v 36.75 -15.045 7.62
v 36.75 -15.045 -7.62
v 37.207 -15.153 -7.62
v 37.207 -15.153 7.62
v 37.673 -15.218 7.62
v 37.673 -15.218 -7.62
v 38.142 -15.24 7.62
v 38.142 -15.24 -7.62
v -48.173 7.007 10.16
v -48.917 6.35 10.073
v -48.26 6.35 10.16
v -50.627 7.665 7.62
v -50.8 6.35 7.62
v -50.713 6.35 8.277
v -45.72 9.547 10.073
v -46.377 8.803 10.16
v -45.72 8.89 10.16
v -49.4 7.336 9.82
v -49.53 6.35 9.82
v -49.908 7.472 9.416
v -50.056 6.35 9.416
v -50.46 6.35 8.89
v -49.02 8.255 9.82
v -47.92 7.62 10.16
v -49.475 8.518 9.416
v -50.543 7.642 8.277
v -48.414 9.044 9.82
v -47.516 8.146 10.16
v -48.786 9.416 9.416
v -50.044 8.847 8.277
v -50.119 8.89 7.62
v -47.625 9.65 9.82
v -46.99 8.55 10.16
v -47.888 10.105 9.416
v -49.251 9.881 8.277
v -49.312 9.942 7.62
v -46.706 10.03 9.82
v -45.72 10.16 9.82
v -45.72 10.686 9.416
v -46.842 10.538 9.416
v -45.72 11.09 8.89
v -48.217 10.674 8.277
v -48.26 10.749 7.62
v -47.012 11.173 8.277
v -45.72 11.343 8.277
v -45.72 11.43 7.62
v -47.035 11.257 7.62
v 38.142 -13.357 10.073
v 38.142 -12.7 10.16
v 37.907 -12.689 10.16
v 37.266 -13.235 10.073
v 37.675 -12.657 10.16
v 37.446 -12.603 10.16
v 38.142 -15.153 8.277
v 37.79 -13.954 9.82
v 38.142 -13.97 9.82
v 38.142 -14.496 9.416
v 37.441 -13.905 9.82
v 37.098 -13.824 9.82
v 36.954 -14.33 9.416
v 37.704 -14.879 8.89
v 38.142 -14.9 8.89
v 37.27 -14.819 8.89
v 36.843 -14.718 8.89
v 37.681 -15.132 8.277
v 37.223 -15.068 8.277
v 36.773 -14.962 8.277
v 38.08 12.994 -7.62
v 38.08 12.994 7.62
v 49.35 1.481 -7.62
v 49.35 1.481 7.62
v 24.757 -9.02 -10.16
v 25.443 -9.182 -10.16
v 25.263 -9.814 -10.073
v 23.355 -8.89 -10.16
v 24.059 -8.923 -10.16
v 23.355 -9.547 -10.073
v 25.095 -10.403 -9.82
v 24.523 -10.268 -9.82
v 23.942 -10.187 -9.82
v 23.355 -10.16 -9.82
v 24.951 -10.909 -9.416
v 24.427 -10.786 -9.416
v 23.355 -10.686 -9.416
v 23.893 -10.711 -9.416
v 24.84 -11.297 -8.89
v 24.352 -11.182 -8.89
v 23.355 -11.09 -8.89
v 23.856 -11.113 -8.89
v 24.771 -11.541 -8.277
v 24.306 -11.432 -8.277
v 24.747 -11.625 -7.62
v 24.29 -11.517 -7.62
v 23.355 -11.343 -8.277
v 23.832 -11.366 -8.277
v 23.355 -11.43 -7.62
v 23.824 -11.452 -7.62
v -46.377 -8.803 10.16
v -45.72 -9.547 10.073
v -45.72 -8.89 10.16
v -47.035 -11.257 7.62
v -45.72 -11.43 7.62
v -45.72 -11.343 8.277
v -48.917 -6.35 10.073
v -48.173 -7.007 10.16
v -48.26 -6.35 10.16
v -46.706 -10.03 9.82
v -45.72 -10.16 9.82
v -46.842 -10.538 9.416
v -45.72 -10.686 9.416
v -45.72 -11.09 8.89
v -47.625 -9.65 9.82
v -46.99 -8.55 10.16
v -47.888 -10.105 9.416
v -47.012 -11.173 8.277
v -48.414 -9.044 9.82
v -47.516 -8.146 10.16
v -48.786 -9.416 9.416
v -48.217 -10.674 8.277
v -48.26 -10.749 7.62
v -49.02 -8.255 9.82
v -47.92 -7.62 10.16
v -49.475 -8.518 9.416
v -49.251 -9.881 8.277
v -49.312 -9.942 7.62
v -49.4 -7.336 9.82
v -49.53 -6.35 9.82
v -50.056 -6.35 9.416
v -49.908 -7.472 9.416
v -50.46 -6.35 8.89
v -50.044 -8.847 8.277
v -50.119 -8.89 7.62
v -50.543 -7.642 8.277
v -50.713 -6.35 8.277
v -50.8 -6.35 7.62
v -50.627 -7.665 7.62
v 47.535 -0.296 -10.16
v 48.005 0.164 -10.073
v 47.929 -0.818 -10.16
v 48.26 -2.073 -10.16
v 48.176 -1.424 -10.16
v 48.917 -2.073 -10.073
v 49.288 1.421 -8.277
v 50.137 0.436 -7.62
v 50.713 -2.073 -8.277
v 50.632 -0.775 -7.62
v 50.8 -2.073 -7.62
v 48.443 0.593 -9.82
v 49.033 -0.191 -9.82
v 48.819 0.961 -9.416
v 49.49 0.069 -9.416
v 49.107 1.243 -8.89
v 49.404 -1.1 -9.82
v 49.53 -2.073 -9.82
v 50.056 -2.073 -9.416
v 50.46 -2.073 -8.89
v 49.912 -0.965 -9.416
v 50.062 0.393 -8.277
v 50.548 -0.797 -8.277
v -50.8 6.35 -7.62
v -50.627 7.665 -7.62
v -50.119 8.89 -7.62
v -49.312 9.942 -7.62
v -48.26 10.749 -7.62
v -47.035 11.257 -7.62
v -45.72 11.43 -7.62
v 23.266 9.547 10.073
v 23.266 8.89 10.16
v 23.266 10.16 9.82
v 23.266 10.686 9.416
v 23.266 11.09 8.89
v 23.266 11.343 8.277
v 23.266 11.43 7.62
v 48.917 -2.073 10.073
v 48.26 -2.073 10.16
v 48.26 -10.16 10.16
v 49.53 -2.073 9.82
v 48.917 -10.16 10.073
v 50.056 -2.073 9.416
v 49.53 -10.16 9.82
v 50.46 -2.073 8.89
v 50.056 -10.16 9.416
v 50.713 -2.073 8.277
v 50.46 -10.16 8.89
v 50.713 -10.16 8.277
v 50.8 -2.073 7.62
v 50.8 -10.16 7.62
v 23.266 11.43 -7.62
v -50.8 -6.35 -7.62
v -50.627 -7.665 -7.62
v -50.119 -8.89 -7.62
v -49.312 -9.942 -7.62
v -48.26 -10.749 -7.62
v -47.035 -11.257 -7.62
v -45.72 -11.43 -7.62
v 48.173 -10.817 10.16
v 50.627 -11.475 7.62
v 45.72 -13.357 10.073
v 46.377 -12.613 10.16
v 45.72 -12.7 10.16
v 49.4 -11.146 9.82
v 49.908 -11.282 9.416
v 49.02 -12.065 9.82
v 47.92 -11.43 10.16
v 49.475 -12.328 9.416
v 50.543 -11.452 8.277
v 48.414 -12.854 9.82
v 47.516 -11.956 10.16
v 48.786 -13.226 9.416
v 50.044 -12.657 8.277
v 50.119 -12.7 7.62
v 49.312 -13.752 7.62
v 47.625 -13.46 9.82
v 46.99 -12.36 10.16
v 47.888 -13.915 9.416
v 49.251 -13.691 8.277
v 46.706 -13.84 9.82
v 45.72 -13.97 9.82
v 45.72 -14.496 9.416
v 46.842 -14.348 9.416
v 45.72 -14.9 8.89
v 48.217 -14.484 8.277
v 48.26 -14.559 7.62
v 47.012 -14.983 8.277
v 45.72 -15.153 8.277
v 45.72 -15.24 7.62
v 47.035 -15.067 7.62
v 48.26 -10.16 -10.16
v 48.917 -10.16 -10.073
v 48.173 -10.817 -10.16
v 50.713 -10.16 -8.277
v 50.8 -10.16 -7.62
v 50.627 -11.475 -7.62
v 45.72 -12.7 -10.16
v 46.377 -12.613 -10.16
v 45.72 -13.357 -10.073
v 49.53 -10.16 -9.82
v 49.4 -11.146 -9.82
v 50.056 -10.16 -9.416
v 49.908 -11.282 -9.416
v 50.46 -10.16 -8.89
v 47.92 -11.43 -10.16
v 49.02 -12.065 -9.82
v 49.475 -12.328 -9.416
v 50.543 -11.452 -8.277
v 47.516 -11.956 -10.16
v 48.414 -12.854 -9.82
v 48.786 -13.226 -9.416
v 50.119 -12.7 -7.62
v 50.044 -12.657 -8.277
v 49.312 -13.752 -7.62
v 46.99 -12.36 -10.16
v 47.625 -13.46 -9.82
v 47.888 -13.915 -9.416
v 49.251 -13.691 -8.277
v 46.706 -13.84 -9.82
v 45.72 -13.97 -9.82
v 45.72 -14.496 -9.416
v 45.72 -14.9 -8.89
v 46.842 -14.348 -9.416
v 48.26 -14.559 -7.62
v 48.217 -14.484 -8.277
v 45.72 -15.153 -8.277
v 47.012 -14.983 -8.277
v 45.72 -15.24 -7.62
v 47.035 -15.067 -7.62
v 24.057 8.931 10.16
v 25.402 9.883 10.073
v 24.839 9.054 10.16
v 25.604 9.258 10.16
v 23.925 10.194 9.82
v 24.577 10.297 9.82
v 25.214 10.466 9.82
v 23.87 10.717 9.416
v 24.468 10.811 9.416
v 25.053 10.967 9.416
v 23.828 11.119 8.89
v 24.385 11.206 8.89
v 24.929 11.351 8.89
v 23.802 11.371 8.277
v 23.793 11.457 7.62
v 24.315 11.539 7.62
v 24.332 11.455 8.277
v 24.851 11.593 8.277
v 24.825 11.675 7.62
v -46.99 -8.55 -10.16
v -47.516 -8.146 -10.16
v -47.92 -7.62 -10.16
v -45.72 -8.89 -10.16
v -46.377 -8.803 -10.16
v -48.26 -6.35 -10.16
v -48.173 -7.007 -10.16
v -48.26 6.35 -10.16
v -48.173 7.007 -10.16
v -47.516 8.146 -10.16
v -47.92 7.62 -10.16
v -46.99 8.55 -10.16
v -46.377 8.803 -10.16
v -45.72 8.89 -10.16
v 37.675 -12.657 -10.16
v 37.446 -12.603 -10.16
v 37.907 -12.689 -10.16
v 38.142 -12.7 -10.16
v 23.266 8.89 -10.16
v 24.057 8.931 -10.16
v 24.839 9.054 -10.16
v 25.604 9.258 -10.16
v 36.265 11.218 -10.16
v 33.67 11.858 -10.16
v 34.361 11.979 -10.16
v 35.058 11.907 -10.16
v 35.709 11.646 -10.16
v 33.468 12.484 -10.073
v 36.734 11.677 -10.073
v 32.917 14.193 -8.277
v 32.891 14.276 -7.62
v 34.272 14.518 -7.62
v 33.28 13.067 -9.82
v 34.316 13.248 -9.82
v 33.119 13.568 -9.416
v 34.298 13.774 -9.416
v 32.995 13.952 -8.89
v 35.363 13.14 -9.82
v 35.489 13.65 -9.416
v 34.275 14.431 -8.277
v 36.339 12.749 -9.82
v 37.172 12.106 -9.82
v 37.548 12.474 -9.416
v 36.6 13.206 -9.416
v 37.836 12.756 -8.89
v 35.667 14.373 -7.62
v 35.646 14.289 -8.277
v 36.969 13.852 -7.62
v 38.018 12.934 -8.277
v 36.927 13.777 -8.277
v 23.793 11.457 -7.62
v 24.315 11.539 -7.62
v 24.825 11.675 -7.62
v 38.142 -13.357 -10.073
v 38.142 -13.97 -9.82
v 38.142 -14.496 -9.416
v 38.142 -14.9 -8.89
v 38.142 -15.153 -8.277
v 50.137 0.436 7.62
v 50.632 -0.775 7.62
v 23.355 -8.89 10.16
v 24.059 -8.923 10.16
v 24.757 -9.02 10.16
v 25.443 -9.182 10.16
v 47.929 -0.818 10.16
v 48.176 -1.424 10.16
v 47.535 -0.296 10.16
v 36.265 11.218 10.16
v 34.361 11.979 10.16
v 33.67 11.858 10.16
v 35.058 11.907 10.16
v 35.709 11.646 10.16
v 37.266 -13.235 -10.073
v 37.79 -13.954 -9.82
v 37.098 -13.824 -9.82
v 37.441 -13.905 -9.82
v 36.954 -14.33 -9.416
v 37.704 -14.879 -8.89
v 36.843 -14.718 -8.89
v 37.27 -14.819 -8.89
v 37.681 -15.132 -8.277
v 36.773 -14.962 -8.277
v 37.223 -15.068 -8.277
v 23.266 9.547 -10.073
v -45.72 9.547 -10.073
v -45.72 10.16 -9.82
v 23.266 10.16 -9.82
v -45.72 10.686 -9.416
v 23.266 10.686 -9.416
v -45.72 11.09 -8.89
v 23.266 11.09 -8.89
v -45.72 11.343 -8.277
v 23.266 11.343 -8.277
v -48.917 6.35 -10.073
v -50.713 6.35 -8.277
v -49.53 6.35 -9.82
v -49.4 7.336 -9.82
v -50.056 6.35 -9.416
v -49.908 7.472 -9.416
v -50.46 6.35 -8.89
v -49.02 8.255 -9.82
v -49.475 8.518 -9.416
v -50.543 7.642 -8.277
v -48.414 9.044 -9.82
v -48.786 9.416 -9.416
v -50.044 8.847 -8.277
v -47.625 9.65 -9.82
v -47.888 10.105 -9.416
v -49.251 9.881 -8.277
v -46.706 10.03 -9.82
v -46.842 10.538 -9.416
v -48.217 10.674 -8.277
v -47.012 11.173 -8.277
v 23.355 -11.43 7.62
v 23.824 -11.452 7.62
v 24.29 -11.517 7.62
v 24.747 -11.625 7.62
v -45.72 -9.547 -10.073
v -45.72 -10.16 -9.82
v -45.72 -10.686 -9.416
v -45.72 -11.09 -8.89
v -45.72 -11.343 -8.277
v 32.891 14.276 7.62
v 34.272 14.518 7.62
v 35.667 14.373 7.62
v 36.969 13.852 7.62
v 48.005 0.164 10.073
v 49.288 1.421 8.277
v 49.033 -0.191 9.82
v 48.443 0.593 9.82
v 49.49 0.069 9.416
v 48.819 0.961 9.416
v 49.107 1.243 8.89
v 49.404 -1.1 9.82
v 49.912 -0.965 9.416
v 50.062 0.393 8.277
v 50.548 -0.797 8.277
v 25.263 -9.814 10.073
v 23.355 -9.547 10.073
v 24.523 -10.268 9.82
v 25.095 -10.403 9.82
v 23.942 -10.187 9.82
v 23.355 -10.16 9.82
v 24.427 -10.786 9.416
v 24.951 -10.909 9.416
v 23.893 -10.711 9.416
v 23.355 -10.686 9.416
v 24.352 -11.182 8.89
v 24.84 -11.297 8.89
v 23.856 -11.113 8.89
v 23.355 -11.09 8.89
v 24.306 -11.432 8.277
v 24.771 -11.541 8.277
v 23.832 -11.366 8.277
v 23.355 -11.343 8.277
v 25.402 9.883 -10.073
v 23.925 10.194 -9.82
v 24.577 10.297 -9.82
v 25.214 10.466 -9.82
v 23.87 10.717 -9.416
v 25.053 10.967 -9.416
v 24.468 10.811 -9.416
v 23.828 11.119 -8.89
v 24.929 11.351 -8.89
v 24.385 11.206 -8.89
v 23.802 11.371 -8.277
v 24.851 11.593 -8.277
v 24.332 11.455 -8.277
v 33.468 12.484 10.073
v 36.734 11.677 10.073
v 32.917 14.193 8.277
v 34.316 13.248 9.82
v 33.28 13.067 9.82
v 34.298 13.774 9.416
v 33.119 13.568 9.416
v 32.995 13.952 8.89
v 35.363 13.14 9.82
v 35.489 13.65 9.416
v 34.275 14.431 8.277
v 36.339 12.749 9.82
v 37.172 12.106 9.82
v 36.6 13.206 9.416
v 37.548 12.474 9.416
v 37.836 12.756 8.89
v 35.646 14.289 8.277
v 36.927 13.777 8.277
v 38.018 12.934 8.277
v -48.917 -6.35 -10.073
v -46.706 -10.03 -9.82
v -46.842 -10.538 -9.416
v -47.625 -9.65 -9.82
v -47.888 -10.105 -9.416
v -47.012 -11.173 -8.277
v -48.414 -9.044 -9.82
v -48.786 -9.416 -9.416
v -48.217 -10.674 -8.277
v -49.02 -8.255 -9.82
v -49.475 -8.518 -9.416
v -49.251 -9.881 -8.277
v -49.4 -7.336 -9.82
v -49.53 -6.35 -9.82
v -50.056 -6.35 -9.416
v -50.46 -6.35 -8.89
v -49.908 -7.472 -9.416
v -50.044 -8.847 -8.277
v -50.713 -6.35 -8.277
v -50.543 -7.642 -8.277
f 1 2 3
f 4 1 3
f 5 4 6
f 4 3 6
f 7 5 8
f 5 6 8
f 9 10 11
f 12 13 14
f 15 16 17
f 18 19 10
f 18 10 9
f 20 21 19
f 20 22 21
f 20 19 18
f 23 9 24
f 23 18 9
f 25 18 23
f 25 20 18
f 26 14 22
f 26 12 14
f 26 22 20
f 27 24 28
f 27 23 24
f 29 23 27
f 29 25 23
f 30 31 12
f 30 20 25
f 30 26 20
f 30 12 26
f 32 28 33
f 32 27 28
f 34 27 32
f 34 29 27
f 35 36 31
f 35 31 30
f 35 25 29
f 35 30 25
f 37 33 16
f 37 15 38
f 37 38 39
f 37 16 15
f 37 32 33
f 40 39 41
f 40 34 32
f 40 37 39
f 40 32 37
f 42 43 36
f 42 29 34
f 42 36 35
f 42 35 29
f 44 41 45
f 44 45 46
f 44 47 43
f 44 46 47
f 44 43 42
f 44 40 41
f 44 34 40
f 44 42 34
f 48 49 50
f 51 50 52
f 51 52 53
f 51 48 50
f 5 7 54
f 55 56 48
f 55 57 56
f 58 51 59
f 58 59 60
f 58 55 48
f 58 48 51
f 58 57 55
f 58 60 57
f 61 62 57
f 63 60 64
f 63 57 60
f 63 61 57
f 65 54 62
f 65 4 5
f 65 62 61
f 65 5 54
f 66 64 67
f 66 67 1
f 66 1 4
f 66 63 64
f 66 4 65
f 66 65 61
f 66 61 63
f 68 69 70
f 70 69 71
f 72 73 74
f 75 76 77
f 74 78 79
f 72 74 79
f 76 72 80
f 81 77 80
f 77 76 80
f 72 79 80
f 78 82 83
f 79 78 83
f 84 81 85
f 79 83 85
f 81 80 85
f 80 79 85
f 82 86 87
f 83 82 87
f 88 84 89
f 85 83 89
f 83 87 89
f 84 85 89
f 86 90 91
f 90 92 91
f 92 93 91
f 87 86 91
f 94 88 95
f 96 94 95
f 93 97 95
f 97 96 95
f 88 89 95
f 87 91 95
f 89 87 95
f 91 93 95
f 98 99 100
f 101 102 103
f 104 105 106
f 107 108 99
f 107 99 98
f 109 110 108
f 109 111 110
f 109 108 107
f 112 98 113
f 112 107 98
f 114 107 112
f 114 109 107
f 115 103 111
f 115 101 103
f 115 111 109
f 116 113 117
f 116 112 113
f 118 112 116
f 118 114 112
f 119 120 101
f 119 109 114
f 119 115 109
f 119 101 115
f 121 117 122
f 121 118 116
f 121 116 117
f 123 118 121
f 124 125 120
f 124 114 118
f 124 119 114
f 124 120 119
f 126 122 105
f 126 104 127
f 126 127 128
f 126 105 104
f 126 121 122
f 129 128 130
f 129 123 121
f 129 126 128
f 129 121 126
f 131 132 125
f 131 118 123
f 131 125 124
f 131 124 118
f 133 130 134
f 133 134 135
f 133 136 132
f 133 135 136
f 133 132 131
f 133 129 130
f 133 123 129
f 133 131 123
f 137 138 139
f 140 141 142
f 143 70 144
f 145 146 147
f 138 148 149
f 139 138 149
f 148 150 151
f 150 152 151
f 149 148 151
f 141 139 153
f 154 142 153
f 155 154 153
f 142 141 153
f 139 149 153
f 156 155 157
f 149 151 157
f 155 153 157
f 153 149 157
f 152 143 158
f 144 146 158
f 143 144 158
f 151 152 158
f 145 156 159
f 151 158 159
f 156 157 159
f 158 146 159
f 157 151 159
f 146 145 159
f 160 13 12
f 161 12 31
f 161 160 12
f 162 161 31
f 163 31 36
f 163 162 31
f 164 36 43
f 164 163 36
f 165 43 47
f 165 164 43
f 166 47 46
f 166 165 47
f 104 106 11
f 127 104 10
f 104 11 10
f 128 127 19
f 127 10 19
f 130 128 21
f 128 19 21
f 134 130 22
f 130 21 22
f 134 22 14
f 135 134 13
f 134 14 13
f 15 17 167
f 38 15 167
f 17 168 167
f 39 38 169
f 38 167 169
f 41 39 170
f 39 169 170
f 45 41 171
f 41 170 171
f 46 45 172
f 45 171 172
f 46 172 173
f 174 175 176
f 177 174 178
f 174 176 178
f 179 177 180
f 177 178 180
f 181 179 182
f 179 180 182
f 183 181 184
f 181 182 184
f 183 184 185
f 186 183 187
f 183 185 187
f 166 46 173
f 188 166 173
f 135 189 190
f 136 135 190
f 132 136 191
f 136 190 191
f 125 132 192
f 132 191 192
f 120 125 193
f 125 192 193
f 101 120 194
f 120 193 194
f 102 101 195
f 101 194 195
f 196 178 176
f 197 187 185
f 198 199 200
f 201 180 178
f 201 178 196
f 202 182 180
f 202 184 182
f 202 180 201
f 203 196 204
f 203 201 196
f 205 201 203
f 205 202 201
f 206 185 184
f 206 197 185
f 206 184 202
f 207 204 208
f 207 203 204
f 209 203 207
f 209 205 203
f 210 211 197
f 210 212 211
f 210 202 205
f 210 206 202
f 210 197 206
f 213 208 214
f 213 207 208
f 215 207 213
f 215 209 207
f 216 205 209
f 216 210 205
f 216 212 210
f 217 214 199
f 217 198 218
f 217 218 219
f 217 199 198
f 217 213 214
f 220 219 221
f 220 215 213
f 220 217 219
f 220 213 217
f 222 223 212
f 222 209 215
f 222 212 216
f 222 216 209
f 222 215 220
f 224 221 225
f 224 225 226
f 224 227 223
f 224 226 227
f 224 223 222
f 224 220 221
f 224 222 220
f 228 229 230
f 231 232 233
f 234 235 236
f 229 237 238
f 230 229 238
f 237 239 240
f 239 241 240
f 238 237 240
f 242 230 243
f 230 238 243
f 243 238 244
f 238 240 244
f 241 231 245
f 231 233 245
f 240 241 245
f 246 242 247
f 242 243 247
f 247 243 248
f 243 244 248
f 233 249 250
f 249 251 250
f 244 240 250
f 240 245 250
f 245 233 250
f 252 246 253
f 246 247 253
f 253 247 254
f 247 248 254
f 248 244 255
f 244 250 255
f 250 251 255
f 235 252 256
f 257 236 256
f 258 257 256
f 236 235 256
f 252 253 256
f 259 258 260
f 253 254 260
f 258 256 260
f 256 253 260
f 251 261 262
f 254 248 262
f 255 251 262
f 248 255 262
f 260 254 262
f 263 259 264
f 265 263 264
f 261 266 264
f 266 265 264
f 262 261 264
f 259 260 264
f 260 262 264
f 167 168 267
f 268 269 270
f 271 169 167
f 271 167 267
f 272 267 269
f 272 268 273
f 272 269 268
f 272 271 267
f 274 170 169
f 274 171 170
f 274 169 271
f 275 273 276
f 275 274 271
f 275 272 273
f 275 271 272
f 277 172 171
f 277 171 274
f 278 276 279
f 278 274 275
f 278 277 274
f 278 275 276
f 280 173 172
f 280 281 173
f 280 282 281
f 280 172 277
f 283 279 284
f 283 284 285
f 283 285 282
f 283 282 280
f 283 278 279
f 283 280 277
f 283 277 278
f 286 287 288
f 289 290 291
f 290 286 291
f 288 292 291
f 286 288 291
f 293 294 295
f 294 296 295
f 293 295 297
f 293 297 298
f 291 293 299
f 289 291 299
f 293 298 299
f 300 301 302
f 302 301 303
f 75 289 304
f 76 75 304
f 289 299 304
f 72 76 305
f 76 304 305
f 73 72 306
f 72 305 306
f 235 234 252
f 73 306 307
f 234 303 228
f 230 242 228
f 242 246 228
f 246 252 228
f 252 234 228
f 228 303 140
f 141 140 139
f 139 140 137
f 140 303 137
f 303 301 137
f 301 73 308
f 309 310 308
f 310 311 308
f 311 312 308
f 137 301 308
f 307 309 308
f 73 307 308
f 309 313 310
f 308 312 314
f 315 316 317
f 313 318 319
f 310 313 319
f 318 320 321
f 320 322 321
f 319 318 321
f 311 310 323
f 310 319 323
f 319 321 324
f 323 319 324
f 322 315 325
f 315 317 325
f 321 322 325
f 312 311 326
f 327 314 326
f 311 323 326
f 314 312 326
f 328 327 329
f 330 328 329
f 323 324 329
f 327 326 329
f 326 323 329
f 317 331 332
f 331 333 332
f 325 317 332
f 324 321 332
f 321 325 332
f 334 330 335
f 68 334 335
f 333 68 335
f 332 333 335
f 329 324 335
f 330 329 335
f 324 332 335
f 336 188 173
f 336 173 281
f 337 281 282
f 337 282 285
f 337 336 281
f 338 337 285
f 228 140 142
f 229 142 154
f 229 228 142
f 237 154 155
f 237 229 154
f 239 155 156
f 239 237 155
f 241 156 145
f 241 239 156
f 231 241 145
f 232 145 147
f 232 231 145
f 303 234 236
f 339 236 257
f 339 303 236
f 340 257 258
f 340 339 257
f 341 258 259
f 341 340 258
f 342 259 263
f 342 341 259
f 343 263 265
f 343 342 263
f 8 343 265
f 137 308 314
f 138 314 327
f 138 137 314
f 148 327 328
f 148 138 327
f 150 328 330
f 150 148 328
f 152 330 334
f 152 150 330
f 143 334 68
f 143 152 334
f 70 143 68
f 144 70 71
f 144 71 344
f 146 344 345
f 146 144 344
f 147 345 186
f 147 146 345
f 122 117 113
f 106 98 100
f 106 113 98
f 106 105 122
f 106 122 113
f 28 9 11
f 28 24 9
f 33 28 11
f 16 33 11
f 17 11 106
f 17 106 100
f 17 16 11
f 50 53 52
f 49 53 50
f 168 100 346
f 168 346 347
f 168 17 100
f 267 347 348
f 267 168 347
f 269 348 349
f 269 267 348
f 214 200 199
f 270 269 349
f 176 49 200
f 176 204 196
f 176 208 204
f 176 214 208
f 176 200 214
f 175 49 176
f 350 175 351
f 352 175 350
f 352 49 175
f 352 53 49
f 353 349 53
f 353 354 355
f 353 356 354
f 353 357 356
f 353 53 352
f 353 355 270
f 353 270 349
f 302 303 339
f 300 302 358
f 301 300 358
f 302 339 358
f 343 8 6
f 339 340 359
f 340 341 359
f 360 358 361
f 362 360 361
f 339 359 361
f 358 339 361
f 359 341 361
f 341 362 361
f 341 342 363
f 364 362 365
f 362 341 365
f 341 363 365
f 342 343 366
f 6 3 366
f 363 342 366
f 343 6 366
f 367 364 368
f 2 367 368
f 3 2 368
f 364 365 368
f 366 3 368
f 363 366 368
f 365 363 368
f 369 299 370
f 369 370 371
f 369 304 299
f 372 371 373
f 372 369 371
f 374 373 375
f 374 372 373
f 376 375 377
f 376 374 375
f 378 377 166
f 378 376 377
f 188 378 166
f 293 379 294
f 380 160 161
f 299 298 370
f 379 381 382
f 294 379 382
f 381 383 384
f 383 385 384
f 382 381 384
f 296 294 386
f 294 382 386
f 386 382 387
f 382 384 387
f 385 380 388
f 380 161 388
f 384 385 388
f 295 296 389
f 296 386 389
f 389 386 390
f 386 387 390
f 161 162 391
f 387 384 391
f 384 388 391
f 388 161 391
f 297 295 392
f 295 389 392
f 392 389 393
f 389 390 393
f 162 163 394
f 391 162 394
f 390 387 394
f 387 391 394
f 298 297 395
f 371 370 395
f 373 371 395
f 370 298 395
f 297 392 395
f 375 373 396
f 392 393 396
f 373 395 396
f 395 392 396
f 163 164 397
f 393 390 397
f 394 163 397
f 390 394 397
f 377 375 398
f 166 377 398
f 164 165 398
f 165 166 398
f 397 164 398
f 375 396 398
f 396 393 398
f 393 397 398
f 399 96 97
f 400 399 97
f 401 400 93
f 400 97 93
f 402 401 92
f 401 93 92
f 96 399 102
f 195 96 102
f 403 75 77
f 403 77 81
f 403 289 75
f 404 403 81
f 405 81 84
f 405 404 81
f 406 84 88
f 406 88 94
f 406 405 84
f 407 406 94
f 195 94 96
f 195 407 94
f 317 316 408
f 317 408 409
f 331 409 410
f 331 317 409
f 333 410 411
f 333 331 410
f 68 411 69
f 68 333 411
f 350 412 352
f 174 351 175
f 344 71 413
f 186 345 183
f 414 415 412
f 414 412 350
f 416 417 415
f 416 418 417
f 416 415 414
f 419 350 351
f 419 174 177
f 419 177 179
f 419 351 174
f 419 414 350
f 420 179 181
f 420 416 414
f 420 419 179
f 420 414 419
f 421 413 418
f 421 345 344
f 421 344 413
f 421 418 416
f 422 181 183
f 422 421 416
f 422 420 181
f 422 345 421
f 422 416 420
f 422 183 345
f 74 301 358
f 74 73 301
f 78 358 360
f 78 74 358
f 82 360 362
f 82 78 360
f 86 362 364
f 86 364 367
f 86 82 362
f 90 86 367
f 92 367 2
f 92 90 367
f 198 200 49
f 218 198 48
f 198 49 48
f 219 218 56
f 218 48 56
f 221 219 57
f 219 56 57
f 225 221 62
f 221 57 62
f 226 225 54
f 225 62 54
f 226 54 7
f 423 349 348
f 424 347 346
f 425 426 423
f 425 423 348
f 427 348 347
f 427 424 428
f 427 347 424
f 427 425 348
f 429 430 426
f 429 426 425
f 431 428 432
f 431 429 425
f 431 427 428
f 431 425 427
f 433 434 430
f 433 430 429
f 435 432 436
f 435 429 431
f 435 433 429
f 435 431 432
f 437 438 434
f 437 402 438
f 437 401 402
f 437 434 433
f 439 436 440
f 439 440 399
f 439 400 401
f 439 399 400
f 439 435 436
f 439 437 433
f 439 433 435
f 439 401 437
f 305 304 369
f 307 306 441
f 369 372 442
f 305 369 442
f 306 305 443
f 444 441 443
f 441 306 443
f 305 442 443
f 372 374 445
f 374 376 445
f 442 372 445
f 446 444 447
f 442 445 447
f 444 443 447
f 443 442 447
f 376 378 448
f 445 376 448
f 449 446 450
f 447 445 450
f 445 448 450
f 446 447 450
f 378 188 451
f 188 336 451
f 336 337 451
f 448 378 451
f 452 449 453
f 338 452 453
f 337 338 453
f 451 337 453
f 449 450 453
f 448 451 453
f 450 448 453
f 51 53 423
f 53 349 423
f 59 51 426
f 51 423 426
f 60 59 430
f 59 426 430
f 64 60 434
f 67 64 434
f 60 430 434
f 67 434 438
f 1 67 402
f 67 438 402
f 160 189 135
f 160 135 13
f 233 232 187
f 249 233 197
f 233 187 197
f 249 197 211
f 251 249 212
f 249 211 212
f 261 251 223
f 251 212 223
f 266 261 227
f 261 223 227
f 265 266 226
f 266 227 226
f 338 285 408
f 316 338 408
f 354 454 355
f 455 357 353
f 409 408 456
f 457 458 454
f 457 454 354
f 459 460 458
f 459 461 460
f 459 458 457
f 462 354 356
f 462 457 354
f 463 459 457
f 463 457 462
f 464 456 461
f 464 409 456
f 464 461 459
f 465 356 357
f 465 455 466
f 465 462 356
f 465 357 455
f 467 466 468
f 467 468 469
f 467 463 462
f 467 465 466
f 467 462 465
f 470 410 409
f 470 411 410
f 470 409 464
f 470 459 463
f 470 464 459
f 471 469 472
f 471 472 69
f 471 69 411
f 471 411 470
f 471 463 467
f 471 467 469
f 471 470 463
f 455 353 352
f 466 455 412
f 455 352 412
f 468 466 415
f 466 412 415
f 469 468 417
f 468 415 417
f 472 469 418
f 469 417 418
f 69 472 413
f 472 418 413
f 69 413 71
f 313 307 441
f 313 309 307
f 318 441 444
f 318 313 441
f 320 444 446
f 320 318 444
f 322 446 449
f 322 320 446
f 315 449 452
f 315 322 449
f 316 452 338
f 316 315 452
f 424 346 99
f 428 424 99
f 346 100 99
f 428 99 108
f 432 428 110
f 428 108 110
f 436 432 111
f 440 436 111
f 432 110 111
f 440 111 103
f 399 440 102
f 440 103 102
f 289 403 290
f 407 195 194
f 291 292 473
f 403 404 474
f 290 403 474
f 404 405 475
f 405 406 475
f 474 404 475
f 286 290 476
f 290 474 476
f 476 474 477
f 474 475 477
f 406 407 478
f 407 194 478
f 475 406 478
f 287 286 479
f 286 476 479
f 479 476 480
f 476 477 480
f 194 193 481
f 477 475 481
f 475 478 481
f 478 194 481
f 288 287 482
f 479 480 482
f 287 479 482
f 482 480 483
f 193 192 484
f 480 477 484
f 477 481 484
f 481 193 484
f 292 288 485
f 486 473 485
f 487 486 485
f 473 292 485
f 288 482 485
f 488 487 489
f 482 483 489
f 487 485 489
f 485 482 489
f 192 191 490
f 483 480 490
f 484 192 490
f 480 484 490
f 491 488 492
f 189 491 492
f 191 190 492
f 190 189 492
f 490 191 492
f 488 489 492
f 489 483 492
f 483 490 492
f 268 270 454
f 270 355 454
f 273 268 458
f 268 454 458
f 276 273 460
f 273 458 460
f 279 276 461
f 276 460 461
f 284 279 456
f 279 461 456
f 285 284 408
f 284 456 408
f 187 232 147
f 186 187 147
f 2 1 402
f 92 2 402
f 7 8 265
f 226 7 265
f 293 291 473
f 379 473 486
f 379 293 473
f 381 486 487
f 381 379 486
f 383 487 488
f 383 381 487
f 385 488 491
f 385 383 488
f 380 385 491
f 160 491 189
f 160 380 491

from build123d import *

# Parameters (mm, degrees)
F0_W          = 101.6
F0_H          = 30.48
F1_DEPTH      = 10.16
F1_DEPTH_BACK = 10.16
F3_DEPTH      = 25.4
F4_R          = 5.08
F5_R          = 2.54


with BuildPart() as f1:
    # F0 (on Top) → F1 (new body, two sides)
    with BuildSketch(Plane.XY) as f1_sk:
        Rectangle(F0_W, F0_H)
    extrude(amount=F1_DEPTH)
    extrude(f1_sk.sketch, amount=-F1_DEPTH_BACK)

    # F2 (on face) → F3 (cut)
    with BuildSketch(Plane.XY.offset(10.16)):
        Polygon((37.4322741568, -15.24), (24.0645483136, -11.43), (-50.8, -11.43), (-50.8, -15.24), align=None)
        Polygon((35.8814075589, 15.24), (50.8, 0), (50.8, 15.24), align=None)
        Polygon((-50.8, 15.24), (-50.8, 11.43), (24.0645483136, 11.43), (35.8814075589, 15.24), align=None)
        Polygon((-50.8, -15.24), (-50.8, -11.43), (-50.8, 11.43), (-50.8, 15.24), (35.8814075589, 15.24), (50.8, 15.24), (50.8, 0), (61.7307946086, 0), (61.7307946086, 22.9567158967), (-64.5619183779, 22.9567158967), (-64.5619183779, -22.5874371827), (63.700273633, -22.5874371827), (50.8, -15.24), (37.4322741568, -15.24), align=None)
    extrude(amount=-F3_DEPTH, mode=Mode.SUBTRACT)

    # F4
    f4_edges = [f1.edges().sort_by_distance(p)[0] for p in [
        (35.881408, 15.24, 0),
        (24.064548, 11.43, 0),
        (50.8, -15.24, 0),
        (37.432274, -15.24, 0),
        (24.064548, -11.43, 0),
        (-50.8, -11.43, 0),
        (-50.8, 11.43, 0),
        (50.8, 0, 0),
    ]]
    fillet(f4_edges, radius=F4_R)

    # F5
    f5_edges = [f1.edges().sort_by_distance(p)[0] for p in [
        (30.748411, -13.335, -10.16),
        (37.439103, -15.191126, -10.16),
        (24.057719, -11.478874, -10.16),
        (41.931039, -15.24, -10.16),
        (-11.182628, -11.43, -10.16),
        (49.312102, -13.752102, -10.16),
        (-49.312102, -9.942102, -10.16),
        (50.8, -6.116281, -10.16),
        (-50.8, 0, -10.16),
        (50.4236, -0.153565, -10.16),
        (-49.312102, 9.942102, -10.16),
        (43.714908, 7.237734, -10.16),
        (-11.227078, 11.43, -10.16),
        (35.667245, 14.372668, -10.16),
        (24.054856, 11.491648, -10.16),
        (28.857652, 12.975396, -10.16),
        (30.748411, -13.335, 10.16),
        (37.439103, -15.191126, 10.16),
        (24.057719, -11.478874, 10.16),
        (41.931039, -15.24, 10.16),
        (-11.182628, -11.43, 10.16),
        (49.312102, -13.752102, 10.16),
        (-49.312102, -9.942102, 10.16),
        (50.8, -6.116281, 10.16),
        (-50.8, 0, 10.16),
        (50.4236, -0.153565, 10.16),
        (-49.312102, 9.942102, 10.16),
        (43.714908, 7.237734, 10.16),
        (-11.227078, 11.43, 10.16),
        (35.667245, 14.372668, 10.16),
        (24.054856, 11.491648, 10.16),
        (28.857652, 12.975396, 10.16),
    ]]
    fillet(f5_edges, radius=F5_R)


solid = f1.part
